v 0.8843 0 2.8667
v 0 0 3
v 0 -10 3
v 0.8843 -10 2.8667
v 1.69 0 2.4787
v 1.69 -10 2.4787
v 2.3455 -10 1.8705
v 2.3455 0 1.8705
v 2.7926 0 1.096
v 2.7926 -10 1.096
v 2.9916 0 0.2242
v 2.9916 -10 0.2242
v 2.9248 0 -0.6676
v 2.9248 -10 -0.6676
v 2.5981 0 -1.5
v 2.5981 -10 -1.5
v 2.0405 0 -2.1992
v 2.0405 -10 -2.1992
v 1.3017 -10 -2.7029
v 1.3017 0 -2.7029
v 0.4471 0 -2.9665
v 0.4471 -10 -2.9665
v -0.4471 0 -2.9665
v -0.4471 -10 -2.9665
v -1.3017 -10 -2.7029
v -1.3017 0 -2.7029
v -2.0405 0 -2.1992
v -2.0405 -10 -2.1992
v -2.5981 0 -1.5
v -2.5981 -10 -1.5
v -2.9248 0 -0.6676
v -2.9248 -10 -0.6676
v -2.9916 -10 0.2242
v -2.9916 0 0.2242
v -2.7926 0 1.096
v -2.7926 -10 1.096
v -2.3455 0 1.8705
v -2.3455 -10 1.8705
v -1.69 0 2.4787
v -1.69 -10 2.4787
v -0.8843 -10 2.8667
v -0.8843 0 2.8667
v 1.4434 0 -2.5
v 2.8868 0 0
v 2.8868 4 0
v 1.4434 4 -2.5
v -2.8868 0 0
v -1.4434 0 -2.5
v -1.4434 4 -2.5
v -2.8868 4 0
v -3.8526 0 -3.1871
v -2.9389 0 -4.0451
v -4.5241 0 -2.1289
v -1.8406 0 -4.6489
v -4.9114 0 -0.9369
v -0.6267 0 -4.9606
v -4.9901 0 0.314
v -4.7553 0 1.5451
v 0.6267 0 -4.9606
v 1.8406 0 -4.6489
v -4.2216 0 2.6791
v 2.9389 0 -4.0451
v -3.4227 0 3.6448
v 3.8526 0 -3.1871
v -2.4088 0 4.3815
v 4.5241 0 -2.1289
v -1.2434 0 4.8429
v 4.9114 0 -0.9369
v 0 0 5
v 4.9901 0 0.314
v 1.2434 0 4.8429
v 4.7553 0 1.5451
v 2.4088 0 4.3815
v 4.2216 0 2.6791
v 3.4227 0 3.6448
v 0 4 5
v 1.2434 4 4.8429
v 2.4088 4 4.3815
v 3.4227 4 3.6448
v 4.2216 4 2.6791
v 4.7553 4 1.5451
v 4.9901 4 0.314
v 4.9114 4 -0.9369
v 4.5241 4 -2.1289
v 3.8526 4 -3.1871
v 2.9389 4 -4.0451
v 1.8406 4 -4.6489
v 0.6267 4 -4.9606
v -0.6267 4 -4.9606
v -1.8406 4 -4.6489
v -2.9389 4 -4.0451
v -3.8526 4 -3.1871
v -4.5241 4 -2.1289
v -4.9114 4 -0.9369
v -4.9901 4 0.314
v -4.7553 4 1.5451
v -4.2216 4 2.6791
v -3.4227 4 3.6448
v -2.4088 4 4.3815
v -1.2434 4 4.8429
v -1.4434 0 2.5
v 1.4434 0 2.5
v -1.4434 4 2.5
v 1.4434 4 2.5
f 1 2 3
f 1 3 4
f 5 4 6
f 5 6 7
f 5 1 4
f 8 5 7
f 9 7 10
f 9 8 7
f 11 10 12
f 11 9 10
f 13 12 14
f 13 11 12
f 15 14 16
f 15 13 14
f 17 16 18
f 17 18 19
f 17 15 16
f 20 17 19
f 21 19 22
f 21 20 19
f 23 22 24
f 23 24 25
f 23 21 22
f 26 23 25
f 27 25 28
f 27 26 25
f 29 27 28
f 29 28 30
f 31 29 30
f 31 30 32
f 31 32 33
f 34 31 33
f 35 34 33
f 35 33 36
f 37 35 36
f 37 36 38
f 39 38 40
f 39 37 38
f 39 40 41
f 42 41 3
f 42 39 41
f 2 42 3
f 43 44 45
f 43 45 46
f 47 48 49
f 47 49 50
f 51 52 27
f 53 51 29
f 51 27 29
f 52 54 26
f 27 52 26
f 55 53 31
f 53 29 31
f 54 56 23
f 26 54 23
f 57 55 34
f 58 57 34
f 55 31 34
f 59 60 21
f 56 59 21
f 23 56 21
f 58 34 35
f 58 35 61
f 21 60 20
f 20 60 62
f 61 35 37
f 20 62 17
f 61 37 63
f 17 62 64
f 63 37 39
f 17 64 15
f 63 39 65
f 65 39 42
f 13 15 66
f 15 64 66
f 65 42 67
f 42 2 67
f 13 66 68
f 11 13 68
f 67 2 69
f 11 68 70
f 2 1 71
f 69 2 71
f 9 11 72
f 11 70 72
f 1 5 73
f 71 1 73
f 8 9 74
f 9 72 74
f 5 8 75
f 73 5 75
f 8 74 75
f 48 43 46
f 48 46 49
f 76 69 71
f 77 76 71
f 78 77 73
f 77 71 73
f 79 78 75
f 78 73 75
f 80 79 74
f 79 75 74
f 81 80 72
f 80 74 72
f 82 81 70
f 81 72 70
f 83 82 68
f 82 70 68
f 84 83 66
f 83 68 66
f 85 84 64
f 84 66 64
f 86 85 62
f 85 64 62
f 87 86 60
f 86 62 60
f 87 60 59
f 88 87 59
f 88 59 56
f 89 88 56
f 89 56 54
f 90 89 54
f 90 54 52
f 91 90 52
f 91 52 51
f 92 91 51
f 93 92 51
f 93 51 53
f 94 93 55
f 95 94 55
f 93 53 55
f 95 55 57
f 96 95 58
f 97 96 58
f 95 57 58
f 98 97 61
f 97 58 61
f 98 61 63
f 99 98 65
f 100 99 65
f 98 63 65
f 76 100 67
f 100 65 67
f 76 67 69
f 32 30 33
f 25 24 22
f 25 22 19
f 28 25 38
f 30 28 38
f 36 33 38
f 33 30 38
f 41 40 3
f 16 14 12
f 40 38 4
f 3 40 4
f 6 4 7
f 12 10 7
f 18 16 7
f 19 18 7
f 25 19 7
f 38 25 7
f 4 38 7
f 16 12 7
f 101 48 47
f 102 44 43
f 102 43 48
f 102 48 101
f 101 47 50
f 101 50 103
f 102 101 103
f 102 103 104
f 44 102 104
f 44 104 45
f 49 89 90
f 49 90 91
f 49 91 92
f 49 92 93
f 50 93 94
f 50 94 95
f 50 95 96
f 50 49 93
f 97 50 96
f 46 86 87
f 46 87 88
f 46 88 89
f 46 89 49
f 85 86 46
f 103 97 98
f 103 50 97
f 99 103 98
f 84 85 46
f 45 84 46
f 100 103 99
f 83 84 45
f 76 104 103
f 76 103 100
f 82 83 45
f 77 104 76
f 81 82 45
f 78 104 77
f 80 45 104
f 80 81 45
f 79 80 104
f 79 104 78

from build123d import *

# Parameters (mm, degrees)
SKETCH1_R      = 3
EXTRUDE1_DEPTH = 10
SKETCH2_R      = 5
EXTRUDE2_DEPTH = 4


with BuildPart() as part:
    # Sketch1 → Extrude1 (new body)
    with BuildSketch(Plane(origin=(0, 0, 0), x_dir=(1, 0, 0), z_dir=(0, 1, 0))):
        with Locations(Location((0, 0, 0), (0, 0, 270))):
            Circle(SKETCH1_R)
    extrude(amount=-EXTRUDE1_DEPTH)

    # Sketch2 → Extrude2 (add)
    with BuildSketch(Plane(origin=(0, 0, 0), x_dir=(1, 0, 0), z_dir=(0, 1, 0))):
        with Locations(Location((0, 0, 0), (0, 0, 270))):
            Circle(SKETCH2_R)
        Polygon((2.886751346, 0), (1.443375673, 2.5), (-1.443375673, 2.5), (-2.886751346, 0), (-1.443375673, -2.5), (1.443375673, -2.5), align=None, mode=Mode.SUBTRACT)
    extrude(amount=EXTRUDE2_DEPTH)


solid = part.part
